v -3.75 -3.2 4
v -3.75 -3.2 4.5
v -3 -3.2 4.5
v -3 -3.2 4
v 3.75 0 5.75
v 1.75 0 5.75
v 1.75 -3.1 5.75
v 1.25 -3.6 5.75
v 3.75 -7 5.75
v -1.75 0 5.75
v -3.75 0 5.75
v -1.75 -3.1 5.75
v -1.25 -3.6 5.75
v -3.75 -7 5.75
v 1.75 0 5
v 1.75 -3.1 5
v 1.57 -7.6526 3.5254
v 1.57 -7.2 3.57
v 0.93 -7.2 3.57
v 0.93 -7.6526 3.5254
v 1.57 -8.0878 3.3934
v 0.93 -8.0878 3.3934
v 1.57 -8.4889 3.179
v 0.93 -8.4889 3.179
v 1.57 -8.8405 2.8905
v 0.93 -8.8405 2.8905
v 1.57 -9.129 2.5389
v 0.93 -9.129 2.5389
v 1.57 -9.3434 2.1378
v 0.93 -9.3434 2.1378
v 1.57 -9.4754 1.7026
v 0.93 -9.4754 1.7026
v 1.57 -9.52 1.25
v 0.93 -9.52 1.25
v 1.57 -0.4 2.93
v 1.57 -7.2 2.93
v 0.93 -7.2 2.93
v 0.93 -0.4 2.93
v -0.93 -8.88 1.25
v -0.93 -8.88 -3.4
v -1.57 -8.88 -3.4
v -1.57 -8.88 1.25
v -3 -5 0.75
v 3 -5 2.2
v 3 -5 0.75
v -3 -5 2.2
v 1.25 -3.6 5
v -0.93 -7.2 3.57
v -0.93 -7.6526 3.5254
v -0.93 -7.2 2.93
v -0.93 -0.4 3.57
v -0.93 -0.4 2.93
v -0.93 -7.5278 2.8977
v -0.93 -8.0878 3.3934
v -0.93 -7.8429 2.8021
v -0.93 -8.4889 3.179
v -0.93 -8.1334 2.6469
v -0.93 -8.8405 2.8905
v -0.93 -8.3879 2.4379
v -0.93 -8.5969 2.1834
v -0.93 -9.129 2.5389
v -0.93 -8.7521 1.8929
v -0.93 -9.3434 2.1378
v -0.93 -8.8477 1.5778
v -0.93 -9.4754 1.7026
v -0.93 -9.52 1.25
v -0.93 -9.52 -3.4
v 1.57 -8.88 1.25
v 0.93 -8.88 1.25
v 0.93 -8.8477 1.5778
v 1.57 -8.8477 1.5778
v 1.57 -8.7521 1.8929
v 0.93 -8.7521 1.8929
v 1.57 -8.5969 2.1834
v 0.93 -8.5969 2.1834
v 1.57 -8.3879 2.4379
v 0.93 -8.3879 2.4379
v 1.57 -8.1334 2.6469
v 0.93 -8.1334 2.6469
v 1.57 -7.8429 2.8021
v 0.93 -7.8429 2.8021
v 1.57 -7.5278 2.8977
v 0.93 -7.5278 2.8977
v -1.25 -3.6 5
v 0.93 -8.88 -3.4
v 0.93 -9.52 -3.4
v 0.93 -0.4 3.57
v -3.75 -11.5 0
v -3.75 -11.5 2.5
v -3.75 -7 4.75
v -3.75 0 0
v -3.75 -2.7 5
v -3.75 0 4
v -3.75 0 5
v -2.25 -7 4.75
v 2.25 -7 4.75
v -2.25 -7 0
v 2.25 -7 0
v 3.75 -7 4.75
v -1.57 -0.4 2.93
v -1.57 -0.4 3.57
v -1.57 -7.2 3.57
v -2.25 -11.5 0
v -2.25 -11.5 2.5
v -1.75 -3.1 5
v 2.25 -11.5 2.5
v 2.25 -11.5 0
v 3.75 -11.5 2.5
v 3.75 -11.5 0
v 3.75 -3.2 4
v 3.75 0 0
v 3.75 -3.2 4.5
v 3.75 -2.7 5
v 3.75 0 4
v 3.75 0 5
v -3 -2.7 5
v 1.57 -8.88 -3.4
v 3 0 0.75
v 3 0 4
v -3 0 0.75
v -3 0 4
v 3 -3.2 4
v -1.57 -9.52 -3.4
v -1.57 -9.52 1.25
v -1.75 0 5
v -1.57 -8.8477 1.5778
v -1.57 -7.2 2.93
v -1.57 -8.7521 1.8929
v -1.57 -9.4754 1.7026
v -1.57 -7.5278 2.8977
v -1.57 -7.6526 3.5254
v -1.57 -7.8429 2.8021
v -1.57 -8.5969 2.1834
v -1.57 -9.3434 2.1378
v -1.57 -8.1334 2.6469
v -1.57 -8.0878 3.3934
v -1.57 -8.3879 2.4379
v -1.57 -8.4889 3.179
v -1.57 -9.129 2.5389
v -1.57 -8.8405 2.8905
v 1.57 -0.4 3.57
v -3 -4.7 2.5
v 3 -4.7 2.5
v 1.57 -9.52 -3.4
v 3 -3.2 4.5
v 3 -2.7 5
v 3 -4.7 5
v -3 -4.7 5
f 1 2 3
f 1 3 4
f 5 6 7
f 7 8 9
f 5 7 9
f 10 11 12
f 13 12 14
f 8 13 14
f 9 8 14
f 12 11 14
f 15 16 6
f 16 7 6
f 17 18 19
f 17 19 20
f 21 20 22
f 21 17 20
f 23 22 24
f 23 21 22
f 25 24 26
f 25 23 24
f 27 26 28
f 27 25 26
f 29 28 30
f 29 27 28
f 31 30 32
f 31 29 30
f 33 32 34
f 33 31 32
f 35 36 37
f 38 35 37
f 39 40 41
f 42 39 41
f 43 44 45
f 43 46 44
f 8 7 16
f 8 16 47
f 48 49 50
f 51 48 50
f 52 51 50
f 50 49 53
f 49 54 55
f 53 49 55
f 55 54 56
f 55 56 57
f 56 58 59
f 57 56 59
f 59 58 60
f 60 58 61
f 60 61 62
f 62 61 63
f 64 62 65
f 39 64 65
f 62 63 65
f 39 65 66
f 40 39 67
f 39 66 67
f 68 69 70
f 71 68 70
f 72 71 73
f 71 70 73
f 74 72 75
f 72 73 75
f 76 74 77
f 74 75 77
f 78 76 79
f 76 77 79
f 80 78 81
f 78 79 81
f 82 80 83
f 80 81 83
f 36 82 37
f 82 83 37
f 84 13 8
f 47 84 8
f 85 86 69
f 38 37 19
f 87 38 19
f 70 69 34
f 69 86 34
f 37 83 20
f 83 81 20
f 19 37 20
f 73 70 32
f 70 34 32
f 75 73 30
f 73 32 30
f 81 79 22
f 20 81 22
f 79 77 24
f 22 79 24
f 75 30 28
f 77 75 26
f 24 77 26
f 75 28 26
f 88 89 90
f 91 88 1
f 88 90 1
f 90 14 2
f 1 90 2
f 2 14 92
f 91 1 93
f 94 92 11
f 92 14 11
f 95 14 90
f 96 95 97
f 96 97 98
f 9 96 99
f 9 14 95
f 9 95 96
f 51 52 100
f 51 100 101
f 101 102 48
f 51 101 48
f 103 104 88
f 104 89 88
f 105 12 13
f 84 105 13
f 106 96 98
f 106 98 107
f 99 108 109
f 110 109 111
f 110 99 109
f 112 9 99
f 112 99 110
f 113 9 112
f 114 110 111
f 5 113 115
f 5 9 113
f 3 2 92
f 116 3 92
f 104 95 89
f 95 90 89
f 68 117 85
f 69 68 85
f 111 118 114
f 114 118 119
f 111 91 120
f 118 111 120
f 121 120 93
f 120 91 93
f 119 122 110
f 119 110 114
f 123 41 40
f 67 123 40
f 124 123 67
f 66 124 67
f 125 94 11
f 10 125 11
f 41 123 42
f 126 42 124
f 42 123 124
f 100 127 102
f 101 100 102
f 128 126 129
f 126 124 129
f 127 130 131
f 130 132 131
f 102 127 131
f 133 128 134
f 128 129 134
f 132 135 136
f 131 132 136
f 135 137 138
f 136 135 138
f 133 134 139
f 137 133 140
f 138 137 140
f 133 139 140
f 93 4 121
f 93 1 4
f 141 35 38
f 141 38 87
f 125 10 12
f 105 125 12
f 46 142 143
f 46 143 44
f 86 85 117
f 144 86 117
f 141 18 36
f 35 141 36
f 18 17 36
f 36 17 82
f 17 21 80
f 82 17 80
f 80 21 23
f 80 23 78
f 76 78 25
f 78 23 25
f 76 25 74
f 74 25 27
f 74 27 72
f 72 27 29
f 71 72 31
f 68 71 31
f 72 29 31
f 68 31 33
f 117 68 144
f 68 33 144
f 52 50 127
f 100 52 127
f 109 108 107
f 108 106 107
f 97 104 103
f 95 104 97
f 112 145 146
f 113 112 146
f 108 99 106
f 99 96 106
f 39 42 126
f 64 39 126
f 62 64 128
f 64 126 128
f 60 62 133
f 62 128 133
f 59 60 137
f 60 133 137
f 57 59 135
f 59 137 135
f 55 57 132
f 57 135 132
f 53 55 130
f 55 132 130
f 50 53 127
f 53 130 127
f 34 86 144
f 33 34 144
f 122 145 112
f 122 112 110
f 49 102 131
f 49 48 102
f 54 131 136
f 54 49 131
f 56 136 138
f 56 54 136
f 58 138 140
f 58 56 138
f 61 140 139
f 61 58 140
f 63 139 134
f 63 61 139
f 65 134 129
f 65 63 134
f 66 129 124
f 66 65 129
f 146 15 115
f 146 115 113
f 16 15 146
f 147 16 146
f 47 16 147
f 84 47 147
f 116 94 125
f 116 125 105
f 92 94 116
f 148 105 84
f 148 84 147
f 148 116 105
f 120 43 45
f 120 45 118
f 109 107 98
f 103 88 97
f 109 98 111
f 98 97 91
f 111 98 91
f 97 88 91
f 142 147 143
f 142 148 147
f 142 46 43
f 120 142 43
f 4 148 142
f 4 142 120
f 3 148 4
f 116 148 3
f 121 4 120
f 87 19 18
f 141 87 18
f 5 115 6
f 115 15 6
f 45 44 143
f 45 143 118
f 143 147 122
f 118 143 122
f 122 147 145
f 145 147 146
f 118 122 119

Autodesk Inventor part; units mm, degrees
ref_plane "YZ Plane" through (0, 0, 0) normal (1, 0, 0) x (0, 1, 0)
ref_plane "XZ Plane" through (0, 0, 0) normal (0, 1, 0) x (-1, 0, 0)
sketch "Boceto40" plane through (0, 0, 0) normal (1, 0, 0) x (0, 1, 0)
  line L0 (0, 0) -> (0, 5.75)
  line L1 (0, 5.75) -> (-7, 5.75)
  line L2 (-7, 5.75) -> (-7, 4.75)
  line L3 (-7, 4.75) -> (-11.5, 2.5)
  line L4 (-11.5, 2.5) -> (-11.5, 0)
  line L5 (-11.5, 0) -> (0, 0)
  dimension "d374" = 5.75
  dimension "d375" = 7
  dimension "d376" = 2.5
  dimension "d377" = 4.5
  dimension "d378" = 1
extrude "Extrusión13" add sketch "Boceto40" along normal mid plane 7.5
sketch "Boceto41" plane through (0, 0, 0) normal (1, 0, 0) x (0, 1, 0)
  line L0 (0, 0) -> (0, 5.75) construction
  line L1 (0, 5.75) -> (-7, 5.75) construction
  line L2 (-7, 5.75) -> (-7, 4.75) construction
  line L3 (-7, 4.75) -> (-11.5, 2.5) construction
  line L4 (-11.5, 2.5) -> (-11.5, 0) construction
  line L5 (-11.5, 0) -> (0, 0) construction
  line L6 (0, 5) -> (-4.7, 5)
  line L7 (-4.7, 5) -> (-4.7, 2.5)
  line L8 (-4.7, 2.5) -> (-5, 2.2)
  line L9 (-5, 2.2) -> (-5, 0.75)
  line L10 (-5, 0.75) -> (0, 0.75)
  line L11 (0, 0.75) -> (0, 5)
  dimension "d381" = 0.75
  dimension "d382" = 0.75
  dimension "d383" = 4.7
  dimension "d384" = 5
  dimension "d385" = 2.5
  dimension "d386" = 45
extrude "Extrusión14" cut sketch "Boceto41" along normal mid plane 6
sketch "Boceto42" plane through (0, 0, 0) normal (1, 0, 0) x (0, 1, 0)
  line L0 (0, 0) -> (0, 5.75) construction
  line L1 (0, 5.75) -> (-7, 5.75) construction
  line L2 (-7, 5.75) -> (-7, 4.75) construction
  line L3 (-7, 4.75) -> (-11.5, 2.5) construction
  line L4 (-11.5, 2.5) -> (-11.5, 0) construction
  line L5 (-11.5, 0) -> (0, 0) construction
  line L6 (0, 5) -> (-2.7, 5)
  line L7 (-3.2, 4.5) -> (-3.2, 4)
  line L8 (-3.2, 4) -> (0, 4)
  line L9 (0, 4) -> (0, 5)
  line L10 (-3.2, 4.5) -> (-2.7, 5)
  point P0 (-3.2, 5)
  dimension "d389" = 1
  dimension "d390" = 0.75
  dimension "d391" = 3.2
  dimension "d392" = 0.5
  dimension "d393" = 0.5
extrude "Extrusión15" cut sketch "Boceto42" along normal mid plane 10
sketch "Boceto43" plane through (-3.75, -7, 5.75) normal (0, 0, 1) x (1, 0, 0)
  line L0 (0, 0) -> (7.5, 0) construction
  line L1 (7.5, 7) -> (7.5, 0) construction
  line L2 (0, 7) -> (7.5, 7) construction
  line L3 (0, 0) -> (0, 7) construction
  line L4 (6, -4.7153) -> (1.5, -4.7153)
  line L5 (1.5, -4.7153) -> (1.5, 0)
  line L6 (1.5, 0) -> (6, 0)
  line L7 (6, 0) -> (6, -4.7153)
  point P0 (3.75, 7)
  dimension "d397" = 1.5
  dimension "d398" = 1.5
extrude "Extrusión16" cut sketch "Boceto43" against normal blind 10
ref_plane "Plano de trabajo12" through (-3, -0.4, 2.5) normal (0, 1, 0) x (1, 0, 0)
sketch "Boceto44" plane through (-3, -0.4, 2.5) normal (0, 1, 0) x (1, 0, 0)
  line L0 (0, 0) -> (6, 0) construction
  line L1 (0, 0) -> (0, -2.5) construction
  line L2 (0, -2.5) -> (6, -2.5) construction
  line L3 (6, -2.5) -> (6, 0) construction
  line L4 (4.57, -1.07) -> (3.93, -1.07)
  line L5 (3.93, -1.07) -> (3.93, -0.43)
  line L6 (3.93, -0.43) -> (4.57, -0.43)
  line L7 (4.57, -0.43) -> (4.57, -1.07)
  line L8 (2.07, -1.07) -> (1.43, -1.07)
  line L9 (1.43, -1.07) -> (1.43, -0.43)
  line L10 (1.43, -0.43) -> (2.07, -0.43)
  line L11 (2.07, -0.43) -> (2.07, -1.07)
  line L12 (3, 2.5) -> (3, -4.081) construction
  line L13 (4.25, -1.07) -> (4.25, -0.43) construction
  line L14 (1.75, -1.07) -> (1.75, -0.43) construction
  line L15 (4.57, -0.75) -> (3.93, -0.75) construction
  line L16 (2.07, -0.75) -> (1.43, -0.75) construction
  line L17 (-0.75, -3.25) -> (6.75, -3.25) projected
  dimension "d402" = 2.5
  dimension "d403" = 0.64
  dimension "d404" = 2.5
sketch "Boceto45" plane through (0, 0, 0) normal (1, 0, 0) x (0, 1, 0)
  line L0 (-0.4, 3.25) -> (-7.2, 3.25)
  line L1 (-9.2, 1.25) -> (-9.2, -3.4)
  line L2 (0, 0.75) -> (0, 4) projected
  arc A0 (-7.2, 3.25) -> (-9.2, 1.25) centre (-7.2, 1.25) ccw
  line L3 (0, 0) -> (-11.5, 0) projected
  dimension "d405" = 9.2
  dimension "d406" = 2
  dimension "d409" = 3.4
sweep "Barrido1" add profiles "Boceto44" path "Boceto45" separate body path curves L0 A0 L1
sketch "Boceto46" plane through (-3.75, -7, 5.75) normal (0, 0, 1) x (1, 0, 0)
  line L0 (0, 0) -> (7.5, 0) construction
  line L1 (7.5, 7) -> (7.5, 0) construction
  line L2 (0, 7) -> (7.5, 7) construction
  line L3 (0, 0) -> (0, 7) construction
  line L4 (5.5, 7) -> (2, 7)
  line L5 (2, 7) -> (2, 3.9)
  line L6 (2.5, 3.4) -> (5, 3.4)
  line L7 (5.5, 3.9) -> (5.5, 7)
  line L8 (2, 3.9) -> (2.5, 3.4)
  line L9 (5.5, 3.9) -> (5, 3.4)
  point P0 (3.75, 7)
  point P1 (2, 3.4)
  point P2 (5.5, 3.4)
  dimension "d412" = 3.6
  dimension "d413" = 2
  dimension "d414" = 2
  dimension "d415" = 0.5
  dimension "d416" = 0.5
  dimension "d417" = 0.5
  dimension "d418" = 0.5
extrude "Extrusión17" cut sketch "Boceto46" against normal blind 1 bodies 1
properties part number "4A-0363.43" material "Plástico PPS"
